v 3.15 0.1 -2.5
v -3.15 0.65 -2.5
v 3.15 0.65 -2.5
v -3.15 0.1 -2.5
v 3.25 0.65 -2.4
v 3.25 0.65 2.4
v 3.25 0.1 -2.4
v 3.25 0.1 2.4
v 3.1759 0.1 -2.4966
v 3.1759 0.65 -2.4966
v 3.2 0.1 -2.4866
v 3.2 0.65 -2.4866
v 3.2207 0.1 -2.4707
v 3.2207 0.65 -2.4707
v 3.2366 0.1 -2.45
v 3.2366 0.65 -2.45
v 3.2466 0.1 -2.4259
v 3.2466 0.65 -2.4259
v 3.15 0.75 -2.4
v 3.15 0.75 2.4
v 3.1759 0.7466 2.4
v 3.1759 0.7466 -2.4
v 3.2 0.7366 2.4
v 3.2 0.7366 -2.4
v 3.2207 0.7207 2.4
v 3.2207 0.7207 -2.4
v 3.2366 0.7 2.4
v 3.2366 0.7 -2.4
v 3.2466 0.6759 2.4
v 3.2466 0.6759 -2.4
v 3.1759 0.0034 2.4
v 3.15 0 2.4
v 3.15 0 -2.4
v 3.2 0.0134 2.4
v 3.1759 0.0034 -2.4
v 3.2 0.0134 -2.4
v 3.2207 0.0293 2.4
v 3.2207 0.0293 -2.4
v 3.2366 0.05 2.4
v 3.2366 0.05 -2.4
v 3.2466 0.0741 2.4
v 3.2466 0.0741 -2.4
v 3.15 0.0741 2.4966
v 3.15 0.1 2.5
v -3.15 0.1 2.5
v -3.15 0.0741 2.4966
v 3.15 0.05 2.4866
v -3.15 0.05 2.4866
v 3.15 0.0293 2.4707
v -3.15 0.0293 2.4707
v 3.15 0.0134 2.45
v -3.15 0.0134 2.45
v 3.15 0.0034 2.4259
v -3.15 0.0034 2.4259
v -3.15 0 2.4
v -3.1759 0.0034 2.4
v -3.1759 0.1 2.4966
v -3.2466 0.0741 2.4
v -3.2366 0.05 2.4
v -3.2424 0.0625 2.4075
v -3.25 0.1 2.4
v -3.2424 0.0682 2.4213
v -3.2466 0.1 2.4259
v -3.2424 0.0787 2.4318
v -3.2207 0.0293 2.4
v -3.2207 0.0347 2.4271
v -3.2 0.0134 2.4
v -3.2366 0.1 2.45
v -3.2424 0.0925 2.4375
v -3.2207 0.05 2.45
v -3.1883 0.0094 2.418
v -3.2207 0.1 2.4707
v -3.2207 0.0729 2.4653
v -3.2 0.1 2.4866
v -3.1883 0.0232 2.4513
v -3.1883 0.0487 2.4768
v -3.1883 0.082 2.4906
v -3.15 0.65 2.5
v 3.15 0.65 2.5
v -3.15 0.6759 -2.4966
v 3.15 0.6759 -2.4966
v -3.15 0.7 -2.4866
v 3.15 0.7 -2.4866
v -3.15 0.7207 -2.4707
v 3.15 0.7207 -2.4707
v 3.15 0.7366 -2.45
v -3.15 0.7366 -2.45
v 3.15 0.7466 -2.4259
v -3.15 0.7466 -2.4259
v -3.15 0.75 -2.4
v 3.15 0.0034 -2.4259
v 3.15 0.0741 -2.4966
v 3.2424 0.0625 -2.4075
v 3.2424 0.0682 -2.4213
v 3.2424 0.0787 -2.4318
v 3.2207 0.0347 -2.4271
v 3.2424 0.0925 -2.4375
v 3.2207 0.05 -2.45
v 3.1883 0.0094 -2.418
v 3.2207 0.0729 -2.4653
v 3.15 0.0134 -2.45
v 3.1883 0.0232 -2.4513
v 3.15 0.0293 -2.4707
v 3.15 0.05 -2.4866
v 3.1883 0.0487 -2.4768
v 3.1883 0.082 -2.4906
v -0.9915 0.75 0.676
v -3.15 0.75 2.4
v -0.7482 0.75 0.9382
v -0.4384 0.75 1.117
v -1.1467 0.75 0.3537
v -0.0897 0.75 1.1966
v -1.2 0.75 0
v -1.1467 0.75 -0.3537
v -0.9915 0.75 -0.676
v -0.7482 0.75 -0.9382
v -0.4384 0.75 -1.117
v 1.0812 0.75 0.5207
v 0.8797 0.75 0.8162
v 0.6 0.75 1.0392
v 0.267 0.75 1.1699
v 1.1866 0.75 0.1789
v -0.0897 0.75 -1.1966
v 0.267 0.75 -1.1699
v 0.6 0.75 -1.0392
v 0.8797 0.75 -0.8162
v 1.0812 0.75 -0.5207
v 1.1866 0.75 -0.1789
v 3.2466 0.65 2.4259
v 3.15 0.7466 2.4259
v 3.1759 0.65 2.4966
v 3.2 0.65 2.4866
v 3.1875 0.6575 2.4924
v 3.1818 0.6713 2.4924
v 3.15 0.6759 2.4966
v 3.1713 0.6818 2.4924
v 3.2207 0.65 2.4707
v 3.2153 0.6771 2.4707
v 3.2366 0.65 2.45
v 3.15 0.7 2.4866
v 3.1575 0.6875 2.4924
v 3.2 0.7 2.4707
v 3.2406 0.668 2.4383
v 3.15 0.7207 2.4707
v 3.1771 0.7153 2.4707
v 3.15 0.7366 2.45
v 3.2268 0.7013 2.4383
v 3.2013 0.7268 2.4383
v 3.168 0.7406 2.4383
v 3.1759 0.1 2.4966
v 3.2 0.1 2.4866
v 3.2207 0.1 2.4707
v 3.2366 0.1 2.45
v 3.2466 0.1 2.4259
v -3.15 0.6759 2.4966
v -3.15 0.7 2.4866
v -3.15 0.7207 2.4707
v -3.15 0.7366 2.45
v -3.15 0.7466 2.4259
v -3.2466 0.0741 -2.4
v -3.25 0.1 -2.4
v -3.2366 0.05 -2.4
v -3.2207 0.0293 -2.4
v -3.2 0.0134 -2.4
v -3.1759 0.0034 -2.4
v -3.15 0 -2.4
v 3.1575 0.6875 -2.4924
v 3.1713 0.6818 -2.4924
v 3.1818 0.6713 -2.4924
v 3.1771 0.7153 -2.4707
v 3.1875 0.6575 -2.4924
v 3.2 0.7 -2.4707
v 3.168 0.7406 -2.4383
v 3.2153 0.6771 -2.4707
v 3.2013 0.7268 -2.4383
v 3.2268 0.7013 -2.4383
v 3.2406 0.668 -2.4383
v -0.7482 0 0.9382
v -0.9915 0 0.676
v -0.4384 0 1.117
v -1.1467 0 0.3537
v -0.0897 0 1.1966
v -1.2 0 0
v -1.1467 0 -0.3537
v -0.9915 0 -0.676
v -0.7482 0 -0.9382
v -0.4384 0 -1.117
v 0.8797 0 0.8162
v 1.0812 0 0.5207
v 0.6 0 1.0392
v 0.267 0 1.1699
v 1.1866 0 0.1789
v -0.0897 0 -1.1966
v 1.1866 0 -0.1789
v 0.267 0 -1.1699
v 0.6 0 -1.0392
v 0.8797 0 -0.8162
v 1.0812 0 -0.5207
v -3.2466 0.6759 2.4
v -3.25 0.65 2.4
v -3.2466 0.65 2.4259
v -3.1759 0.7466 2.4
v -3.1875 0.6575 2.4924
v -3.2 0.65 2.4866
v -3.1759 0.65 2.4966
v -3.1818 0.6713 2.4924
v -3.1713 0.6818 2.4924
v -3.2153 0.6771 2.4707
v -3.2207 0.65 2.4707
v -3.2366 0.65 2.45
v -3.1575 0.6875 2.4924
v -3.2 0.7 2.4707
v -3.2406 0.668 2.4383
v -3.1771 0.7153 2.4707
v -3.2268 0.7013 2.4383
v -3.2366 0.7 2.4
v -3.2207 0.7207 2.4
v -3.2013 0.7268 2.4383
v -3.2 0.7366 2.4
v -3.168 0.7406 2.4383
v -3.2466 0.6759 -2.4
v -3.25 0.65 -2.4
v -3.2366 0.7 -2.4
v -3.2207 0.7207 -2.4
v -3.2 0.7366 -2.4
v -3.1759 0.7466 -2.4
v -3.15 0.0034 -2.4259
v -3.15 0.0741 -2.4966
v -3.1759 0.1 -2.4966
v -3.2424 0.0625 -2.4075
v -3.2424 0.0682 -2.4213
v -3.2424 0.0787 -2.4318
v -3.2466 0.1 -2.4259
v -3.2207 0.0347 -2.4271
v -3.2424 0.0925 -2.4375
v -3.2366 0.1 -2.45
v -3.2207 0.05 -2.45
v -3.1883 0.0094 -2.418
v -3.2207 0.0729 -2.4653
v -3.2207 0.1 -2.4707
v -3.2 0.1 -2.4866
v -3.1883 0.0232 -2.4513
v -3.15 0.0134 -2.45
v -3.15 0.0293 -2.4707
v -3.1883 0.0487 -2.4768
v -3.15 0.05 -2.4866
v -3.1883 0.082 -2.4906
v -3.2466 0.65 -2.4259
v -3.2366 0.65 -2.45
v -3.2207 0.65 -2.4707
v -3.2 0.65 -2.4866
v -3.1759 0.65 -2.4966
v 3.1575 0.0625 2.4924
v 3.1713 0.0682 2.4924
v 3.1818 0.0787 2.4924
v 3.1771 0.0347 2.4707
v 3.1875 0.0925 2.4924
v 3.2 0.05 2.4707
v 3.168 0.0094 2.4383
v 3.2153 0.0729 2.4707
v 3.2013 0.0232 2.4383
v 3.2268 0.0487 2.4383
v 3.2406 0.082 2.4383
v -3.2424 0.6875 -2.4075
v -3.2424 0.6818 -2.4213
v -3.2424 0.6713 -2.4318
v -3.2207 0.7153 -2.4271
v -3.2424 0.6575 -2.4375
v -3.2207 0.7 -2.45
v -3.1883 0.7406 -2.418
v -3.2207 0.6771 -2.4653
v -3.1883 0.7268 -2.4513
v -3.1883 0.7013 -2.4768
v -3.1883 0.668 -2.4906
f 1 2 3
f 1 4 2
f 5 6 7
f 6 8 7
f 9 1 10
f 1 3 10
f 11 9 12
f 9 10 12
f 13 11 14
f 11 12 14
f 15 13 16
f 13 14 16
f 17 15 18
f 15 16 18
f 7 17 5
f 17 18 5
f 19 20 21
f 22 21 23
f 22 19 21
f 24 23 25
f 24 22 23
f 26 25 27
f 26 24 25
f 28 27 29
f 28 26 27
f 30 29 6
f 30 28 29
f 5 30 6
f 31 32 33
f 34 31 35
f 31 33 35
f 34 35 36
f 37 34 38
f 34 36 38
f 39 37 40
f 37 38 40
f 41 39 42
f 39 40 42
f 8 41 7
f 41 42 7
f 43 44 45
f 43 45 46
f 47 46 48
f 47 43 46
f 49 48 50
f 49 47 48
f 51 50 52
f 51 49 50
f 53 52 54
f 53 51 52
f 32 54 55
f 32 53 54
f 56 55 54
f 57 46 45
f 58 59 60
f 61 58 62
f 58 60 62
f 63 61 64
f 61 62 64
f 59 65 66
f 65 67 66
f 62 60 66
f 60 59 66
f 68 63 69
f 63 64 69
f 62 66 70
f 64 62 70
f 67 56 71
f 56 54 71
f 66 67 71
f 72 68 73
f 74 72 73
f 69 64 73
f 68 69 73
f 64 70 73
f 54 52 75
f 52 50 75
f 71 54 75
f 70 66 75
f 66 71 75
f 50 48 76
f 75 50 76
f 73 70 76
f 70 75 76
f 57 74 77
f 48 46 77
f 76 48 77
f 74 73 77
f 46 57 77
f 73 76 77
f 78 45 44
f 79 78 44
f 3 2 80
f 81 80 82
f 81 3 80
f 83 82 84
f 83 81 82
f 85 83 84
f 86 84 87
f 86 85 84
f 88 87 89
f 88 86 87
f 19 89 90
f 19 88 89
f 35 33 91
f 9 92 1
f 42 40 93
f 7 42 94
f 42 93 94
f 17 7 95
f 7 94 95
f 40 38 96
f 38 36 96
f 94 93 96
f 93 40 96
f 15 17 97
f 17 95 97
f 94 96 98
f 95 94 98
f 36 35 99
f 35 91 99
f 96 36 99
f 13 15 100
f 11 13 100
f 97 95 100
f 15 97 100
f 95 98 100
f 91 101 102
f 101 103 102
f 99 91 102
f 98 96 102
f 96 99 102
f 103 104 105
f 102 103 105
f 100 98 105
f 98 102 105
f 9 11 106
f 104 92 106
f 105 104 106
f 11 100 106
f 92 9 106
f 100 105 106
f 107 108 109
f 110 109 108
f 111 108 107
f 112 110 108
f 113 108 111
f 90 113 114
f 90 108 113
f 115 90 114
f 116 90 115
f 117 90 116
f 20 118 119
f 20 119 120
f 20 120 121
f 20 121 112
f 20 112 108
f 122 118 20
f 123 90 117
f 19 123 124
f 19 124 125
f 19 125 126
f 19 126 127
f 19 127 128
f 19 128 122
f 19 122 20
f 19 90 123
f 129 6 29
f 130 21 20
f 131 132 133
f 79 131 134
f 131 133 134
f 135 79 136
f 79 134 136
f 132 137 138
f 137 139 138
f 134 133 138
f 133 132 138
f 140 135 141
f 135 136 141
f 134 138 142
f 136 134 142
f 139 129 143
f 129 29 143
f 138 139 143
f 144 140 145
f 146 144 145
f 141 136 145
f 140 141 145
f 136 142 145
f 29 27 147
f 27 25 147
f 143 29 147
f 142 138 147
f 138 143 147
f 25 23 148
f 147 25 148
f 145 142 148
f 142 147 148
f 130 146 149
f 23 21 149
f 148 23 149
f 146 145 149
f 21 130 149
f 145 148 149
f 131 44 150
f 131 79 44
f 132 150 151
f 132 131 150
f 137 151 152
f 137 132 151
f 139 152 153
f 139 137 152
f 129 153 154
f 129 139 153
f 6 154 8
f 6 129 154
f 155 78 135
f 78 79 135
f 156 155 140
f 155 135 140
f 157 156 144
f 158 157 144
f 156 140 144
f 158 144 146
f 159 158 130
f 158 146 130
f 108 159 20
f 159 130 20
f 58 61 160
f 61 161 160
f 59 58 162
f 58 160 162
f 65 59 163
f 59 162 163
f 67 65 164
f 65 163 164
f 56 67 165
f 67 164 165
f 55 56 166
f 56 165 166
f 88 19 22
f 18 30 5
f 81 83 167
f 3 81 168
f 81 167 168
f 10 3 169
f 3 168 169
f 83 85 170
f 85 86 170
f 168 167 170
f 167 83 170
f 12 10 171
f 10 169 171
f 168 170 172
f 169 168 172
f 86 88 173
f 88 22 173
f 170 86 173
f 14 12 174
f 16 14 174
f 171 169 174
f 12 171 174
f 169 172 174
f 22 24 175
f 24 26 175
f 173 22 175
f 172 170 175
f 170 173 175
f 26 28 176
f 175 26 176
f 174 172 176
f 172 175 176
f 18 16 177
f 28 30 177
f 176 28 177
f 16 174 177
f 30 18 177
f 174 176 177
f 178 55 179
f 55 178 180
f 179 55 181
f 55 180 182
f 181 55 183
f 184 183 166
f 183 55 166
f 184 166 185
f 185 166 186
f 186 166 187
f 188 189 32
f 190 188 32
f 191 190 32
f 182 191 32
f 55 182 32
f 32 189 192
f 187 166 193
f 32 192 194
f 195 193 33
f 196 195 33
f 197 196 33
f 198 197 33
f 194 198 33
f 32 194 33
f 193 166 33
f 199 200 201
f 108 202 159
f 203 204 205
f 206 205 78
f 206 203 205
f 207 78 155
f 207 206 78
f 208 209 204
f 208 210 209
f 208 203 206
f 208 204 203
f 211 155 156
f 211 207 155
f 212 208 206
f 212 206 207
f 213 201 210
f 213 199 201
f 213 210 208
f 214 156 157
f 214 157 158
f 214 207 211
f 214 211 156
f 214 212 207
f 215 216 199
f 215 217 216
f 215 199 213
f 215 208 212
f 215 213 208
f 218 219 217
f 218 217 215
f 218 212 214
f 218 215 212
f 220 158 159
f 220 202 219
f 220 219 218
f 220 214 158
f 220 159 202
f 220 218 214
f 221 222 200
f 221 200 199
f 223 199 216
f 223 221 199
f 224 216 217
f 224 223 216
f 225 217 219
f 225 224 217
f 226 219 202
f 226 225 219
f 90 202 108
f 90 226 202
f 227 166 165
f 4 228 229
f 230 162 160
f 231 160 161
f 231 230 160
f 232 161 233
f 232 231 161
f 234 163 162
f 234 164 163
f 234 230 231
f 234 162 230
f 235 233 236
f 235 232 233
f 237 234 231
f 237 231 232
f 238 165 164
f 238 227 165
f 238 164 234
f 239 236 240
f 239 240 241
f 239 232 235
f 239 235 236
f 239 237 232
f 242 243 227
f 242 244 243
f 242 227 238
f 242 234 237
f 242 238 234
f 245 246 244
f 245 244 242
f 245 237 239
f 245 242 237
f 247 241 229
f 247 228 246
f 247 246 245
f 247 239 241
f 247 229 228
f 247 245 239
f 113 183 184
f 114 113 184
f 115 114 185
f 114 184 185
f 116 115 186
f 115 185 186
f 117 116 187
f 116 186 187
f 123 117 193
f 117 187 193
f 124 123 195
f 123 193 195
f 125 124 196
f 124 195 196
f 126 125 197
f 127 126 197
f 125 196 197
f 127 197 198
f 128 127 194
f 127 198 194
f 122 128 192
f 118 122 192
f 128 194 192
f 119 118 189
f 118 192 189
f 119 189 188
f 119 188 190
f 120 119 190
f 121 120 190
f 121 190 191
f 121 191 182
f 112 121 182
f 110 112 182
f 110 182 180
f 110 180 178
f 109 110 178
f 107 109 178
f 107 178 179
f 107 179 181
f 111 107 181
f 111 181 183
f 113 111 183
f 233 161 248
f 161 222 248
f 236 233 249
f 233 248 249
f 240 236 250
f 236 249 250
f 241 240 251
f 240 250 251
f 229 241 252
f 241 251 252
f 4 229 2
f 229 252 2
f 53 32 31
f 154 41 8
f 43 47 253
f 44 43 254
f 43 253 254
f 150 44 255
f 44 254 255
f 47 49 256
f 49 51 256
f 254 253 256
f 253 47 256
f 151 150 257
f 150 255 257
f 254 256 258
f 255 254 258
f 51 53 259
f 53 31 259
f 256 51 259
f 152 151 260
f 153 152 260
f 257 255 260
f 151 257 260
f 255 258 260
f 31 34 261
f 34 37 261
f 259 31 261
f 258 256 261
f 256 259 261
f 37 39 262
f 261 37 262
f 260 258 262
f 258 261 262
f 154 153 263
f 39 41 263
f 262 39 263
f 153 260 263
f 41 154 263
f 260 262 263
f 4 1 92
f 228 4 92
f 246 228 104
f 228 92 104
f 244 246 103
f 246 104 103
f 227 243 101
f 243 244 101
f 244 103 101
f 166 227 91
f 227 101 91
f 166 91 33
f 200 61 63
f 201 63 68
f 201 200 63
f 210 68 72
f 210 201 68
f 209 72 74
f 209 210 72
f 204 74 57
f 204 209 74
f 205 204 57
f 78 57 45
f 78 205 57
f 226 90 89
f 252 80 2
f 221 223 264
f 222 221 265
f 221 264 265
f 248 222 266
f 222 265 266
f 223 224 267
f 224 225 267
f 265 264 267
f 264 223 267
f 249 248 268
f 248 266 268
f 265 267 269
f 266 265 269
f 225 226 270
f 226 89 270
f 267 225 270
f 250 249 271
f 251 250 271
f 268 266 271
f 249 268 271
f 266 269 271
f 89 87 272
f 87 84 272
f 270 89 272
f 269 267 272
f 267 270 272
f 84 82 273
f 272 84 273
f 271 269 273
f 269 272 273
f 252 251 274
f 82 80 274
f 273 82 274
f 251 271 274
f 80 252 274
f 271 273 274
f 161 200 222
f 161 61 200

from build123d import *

# Parameters (mm, degrees)
SKETCH1_W                = 6.5
SKETCH1_H                = 5
BOSS_EXTRUDE1_DEPTH      = 0.75
M2_CLEARANCE_HOLE1_D     = 2.4
M2_CLEARANCE_HOLE1_DEPTH = 1.6
M2_CLEARANCE_HOLE1_TIP   = 0.721032743
FILLET1_R                = 0.1


with BuildPart() as part:
    # Sketch1 → Boss-Extrude1 (new body)
    with BuildSketch(Plane(origin=(0, 0, 0), x_dir=(1, 0, 0), z_dir=(0, 1, 0))):
        Rectangle(SKETCH1_W, SKETCH1_H)
    extrude(amount=BOSS_EXTRUDE1_DEPTH)

    # M2 Clearance Hole1
    with Locations(Plane(origin=(0, 0.75, 0), x_dir=(1, 0, 0), z_dir=(0, 1, 0))):
        with Locations((0, 0)):
            Hole(M2_CLEARANCE_HOLE1_D / 2, depth=M2_CLEARANCE_HOLE1_DEPTH)
            with Locations((0, 0, -(M2_CLEARANCE_HOLE1_DEPTH + M2_CLEARANCE_HOLE1_TIP / 2))):  # 118° drill point
                Cone(0, M2_CLEARANCE_HOLE1_D / 2, M2_CLEARANCE_HOLE1_TIP, mode=Mode.SUBTRACT)

    # Fillet1
    fillet1_edges = [part.edges().sort_by_distance(p)[0] for p in [
        (3.25, 0.75, 0),
        (0, 0.75, -2.5),
        (-3.25, 0.75, 0),
        (0, 0, -2.5),
        (3.25, 0, 0),
        (0, 0, 2.5),
        (-3.25, 0, 0),
        (-3.25, 0.375, -2.5),
        (3.25, 0.375, -2.5),
        (3.25, 0.375, 2.5),
        (-3.25, 0.375, 2.5),
        (0, 0.75, 2.5),
    ]]
    fillet(fillet1_edges, radius=FILLET1_R)


solid = part.part
